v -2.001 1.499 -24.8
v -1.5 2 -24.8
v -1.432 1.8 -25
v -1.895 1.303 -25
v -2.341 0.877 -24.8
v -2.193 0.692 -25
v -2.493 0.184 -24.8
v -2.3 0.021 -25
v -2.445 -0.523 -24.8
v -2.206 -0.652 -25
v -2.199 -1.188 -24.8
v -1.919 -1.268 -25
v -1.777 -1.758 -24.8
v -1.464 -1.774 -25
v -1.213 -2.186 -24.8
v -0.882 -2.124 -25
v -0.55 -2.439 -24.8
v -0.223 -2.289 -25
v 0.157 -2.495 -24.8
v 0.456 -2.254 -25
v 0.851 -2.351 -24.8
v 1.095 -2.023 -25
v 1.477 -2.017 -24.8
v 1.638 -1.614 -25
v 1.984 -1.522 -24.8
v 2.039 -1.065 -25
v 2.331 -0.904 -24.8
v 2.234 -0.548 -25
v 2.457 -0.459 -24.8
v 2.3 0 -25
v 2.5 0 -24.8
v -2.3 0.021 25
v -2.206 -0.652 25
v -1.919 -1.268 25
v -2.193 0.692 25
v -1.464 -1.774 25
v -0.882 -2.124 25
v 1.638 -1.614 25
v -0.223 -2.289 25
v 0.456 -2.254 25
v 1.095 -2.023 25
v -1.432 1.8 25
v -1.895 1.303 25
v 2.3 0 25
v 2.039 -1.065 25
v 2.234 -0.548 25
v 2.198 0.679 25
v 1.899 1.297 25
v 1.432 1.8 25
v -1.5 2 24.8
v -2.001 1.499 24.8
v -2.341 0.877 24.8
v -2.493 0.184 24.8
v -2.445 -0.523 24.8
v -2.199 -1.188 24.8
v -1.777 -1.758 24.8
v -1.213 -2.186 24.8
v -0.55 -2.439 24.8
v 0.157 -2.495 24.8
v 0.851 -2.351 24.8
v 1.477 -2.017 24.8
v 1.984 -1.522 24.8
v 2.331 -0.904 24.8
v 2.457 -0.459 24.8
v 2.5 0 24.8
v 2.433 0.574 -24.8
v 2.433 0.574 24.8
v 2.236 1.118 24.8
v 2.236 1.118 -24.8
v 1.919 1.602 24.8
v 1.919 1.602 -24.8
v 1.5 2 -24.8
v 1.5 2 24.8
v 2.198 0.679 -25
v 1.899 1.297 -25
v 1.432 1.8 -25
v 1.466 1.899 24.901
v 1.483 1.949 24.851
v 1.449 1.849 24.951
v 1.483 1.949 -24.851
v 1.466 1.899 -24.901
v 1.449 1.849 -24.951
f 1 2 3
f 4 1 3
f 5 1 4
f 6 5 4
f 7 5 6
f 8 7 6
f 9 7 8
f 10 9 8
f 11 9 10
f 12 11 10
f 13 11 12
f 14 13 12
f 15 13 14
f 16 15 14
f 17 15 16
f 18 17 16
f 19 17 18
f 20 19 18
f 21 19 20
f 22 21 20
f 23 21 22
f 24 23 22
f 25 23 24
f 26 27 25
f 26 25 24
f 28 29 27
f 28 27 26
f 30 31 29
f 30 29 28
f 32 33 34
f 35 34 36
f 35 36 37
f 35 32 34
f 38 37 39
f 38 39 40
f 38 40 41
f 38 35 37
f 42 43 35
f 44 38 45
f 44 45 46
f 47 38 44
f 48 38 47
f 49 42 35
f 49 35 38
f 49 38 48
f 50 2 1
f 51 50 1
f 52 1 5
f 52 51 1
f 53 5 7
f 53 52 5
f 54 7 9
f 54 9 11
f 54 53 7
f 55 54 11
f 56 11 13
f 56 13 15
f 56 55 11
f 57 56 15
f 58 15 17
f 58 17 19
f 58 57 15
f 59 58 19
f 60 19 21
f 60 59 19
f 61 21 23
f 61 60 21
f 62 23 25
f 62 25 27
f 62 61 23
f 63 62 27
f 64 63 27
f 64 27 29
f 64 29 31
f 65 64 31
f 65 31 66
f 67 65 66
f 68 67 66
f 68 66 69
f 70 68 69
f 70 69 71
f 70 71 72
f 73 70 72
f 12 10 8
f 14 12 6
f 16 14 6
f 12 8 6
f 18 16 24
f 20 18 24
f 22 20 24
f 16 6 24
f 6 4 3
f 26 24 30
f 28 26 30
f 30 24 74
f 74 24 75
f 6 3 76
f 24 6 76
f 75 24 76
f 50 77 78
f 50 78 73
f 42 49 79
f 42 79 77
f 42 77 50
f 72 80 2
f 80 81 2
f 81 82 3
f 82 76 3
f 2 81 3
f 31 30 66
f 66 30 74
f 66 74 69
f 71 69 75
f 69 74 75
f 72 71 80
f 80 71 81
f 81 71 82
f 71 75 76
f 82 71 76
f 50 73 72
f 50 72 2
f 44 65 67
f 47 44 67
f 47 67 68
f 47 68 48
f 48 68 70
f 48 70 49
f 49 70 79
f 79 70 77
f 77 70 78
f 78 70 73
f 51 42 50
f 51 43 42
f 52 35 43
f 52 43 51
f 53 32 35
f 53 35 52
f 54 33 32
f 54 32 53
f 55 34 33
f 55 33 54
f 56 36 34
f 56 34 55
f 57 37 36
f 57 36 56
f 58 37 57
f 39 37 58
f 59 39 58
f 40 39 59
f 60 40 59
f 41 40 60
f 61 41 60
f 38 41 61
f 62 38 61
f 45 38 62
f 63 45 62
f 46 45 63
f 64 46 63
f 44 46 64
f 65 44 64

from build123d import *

# Parameters (mm, degrees)
BOSS_EXTRUDE1_DEPTH = 25
CHAMFER1_SIZE       = 0.2


with BuildPart() as part:
    # Sketch1 → Boss-Extrude1 (new body, symmetric)
    with BuildSketch(Plane.XY):
        with BuildLine():
            Line((1.5, 2), (-1.5, 2))
            ThreePointArc((-1.5, 2), (-1.118033989, -2.236067977), (2.5, 0))
            ThreePointArc((2.5, 0), (2.236067977, 1.118033989), (1.5, 2))
        make_face()
    extrude(amount=BOSS_EXTRUDE1_DEPTH, both=True)

    # Chamfer1
    chamfer1_edges = [part.edges().sort_by_distance(p)[0] for p in [
        (0, 2, -25),
        (0, -2.5, 25),
        (0, -2.5, -25),
        (0, 2, 25),
    ]]
    chamfer(chamfer1_edges, length=CHAMFER1_SIZE)


solid = part.part
